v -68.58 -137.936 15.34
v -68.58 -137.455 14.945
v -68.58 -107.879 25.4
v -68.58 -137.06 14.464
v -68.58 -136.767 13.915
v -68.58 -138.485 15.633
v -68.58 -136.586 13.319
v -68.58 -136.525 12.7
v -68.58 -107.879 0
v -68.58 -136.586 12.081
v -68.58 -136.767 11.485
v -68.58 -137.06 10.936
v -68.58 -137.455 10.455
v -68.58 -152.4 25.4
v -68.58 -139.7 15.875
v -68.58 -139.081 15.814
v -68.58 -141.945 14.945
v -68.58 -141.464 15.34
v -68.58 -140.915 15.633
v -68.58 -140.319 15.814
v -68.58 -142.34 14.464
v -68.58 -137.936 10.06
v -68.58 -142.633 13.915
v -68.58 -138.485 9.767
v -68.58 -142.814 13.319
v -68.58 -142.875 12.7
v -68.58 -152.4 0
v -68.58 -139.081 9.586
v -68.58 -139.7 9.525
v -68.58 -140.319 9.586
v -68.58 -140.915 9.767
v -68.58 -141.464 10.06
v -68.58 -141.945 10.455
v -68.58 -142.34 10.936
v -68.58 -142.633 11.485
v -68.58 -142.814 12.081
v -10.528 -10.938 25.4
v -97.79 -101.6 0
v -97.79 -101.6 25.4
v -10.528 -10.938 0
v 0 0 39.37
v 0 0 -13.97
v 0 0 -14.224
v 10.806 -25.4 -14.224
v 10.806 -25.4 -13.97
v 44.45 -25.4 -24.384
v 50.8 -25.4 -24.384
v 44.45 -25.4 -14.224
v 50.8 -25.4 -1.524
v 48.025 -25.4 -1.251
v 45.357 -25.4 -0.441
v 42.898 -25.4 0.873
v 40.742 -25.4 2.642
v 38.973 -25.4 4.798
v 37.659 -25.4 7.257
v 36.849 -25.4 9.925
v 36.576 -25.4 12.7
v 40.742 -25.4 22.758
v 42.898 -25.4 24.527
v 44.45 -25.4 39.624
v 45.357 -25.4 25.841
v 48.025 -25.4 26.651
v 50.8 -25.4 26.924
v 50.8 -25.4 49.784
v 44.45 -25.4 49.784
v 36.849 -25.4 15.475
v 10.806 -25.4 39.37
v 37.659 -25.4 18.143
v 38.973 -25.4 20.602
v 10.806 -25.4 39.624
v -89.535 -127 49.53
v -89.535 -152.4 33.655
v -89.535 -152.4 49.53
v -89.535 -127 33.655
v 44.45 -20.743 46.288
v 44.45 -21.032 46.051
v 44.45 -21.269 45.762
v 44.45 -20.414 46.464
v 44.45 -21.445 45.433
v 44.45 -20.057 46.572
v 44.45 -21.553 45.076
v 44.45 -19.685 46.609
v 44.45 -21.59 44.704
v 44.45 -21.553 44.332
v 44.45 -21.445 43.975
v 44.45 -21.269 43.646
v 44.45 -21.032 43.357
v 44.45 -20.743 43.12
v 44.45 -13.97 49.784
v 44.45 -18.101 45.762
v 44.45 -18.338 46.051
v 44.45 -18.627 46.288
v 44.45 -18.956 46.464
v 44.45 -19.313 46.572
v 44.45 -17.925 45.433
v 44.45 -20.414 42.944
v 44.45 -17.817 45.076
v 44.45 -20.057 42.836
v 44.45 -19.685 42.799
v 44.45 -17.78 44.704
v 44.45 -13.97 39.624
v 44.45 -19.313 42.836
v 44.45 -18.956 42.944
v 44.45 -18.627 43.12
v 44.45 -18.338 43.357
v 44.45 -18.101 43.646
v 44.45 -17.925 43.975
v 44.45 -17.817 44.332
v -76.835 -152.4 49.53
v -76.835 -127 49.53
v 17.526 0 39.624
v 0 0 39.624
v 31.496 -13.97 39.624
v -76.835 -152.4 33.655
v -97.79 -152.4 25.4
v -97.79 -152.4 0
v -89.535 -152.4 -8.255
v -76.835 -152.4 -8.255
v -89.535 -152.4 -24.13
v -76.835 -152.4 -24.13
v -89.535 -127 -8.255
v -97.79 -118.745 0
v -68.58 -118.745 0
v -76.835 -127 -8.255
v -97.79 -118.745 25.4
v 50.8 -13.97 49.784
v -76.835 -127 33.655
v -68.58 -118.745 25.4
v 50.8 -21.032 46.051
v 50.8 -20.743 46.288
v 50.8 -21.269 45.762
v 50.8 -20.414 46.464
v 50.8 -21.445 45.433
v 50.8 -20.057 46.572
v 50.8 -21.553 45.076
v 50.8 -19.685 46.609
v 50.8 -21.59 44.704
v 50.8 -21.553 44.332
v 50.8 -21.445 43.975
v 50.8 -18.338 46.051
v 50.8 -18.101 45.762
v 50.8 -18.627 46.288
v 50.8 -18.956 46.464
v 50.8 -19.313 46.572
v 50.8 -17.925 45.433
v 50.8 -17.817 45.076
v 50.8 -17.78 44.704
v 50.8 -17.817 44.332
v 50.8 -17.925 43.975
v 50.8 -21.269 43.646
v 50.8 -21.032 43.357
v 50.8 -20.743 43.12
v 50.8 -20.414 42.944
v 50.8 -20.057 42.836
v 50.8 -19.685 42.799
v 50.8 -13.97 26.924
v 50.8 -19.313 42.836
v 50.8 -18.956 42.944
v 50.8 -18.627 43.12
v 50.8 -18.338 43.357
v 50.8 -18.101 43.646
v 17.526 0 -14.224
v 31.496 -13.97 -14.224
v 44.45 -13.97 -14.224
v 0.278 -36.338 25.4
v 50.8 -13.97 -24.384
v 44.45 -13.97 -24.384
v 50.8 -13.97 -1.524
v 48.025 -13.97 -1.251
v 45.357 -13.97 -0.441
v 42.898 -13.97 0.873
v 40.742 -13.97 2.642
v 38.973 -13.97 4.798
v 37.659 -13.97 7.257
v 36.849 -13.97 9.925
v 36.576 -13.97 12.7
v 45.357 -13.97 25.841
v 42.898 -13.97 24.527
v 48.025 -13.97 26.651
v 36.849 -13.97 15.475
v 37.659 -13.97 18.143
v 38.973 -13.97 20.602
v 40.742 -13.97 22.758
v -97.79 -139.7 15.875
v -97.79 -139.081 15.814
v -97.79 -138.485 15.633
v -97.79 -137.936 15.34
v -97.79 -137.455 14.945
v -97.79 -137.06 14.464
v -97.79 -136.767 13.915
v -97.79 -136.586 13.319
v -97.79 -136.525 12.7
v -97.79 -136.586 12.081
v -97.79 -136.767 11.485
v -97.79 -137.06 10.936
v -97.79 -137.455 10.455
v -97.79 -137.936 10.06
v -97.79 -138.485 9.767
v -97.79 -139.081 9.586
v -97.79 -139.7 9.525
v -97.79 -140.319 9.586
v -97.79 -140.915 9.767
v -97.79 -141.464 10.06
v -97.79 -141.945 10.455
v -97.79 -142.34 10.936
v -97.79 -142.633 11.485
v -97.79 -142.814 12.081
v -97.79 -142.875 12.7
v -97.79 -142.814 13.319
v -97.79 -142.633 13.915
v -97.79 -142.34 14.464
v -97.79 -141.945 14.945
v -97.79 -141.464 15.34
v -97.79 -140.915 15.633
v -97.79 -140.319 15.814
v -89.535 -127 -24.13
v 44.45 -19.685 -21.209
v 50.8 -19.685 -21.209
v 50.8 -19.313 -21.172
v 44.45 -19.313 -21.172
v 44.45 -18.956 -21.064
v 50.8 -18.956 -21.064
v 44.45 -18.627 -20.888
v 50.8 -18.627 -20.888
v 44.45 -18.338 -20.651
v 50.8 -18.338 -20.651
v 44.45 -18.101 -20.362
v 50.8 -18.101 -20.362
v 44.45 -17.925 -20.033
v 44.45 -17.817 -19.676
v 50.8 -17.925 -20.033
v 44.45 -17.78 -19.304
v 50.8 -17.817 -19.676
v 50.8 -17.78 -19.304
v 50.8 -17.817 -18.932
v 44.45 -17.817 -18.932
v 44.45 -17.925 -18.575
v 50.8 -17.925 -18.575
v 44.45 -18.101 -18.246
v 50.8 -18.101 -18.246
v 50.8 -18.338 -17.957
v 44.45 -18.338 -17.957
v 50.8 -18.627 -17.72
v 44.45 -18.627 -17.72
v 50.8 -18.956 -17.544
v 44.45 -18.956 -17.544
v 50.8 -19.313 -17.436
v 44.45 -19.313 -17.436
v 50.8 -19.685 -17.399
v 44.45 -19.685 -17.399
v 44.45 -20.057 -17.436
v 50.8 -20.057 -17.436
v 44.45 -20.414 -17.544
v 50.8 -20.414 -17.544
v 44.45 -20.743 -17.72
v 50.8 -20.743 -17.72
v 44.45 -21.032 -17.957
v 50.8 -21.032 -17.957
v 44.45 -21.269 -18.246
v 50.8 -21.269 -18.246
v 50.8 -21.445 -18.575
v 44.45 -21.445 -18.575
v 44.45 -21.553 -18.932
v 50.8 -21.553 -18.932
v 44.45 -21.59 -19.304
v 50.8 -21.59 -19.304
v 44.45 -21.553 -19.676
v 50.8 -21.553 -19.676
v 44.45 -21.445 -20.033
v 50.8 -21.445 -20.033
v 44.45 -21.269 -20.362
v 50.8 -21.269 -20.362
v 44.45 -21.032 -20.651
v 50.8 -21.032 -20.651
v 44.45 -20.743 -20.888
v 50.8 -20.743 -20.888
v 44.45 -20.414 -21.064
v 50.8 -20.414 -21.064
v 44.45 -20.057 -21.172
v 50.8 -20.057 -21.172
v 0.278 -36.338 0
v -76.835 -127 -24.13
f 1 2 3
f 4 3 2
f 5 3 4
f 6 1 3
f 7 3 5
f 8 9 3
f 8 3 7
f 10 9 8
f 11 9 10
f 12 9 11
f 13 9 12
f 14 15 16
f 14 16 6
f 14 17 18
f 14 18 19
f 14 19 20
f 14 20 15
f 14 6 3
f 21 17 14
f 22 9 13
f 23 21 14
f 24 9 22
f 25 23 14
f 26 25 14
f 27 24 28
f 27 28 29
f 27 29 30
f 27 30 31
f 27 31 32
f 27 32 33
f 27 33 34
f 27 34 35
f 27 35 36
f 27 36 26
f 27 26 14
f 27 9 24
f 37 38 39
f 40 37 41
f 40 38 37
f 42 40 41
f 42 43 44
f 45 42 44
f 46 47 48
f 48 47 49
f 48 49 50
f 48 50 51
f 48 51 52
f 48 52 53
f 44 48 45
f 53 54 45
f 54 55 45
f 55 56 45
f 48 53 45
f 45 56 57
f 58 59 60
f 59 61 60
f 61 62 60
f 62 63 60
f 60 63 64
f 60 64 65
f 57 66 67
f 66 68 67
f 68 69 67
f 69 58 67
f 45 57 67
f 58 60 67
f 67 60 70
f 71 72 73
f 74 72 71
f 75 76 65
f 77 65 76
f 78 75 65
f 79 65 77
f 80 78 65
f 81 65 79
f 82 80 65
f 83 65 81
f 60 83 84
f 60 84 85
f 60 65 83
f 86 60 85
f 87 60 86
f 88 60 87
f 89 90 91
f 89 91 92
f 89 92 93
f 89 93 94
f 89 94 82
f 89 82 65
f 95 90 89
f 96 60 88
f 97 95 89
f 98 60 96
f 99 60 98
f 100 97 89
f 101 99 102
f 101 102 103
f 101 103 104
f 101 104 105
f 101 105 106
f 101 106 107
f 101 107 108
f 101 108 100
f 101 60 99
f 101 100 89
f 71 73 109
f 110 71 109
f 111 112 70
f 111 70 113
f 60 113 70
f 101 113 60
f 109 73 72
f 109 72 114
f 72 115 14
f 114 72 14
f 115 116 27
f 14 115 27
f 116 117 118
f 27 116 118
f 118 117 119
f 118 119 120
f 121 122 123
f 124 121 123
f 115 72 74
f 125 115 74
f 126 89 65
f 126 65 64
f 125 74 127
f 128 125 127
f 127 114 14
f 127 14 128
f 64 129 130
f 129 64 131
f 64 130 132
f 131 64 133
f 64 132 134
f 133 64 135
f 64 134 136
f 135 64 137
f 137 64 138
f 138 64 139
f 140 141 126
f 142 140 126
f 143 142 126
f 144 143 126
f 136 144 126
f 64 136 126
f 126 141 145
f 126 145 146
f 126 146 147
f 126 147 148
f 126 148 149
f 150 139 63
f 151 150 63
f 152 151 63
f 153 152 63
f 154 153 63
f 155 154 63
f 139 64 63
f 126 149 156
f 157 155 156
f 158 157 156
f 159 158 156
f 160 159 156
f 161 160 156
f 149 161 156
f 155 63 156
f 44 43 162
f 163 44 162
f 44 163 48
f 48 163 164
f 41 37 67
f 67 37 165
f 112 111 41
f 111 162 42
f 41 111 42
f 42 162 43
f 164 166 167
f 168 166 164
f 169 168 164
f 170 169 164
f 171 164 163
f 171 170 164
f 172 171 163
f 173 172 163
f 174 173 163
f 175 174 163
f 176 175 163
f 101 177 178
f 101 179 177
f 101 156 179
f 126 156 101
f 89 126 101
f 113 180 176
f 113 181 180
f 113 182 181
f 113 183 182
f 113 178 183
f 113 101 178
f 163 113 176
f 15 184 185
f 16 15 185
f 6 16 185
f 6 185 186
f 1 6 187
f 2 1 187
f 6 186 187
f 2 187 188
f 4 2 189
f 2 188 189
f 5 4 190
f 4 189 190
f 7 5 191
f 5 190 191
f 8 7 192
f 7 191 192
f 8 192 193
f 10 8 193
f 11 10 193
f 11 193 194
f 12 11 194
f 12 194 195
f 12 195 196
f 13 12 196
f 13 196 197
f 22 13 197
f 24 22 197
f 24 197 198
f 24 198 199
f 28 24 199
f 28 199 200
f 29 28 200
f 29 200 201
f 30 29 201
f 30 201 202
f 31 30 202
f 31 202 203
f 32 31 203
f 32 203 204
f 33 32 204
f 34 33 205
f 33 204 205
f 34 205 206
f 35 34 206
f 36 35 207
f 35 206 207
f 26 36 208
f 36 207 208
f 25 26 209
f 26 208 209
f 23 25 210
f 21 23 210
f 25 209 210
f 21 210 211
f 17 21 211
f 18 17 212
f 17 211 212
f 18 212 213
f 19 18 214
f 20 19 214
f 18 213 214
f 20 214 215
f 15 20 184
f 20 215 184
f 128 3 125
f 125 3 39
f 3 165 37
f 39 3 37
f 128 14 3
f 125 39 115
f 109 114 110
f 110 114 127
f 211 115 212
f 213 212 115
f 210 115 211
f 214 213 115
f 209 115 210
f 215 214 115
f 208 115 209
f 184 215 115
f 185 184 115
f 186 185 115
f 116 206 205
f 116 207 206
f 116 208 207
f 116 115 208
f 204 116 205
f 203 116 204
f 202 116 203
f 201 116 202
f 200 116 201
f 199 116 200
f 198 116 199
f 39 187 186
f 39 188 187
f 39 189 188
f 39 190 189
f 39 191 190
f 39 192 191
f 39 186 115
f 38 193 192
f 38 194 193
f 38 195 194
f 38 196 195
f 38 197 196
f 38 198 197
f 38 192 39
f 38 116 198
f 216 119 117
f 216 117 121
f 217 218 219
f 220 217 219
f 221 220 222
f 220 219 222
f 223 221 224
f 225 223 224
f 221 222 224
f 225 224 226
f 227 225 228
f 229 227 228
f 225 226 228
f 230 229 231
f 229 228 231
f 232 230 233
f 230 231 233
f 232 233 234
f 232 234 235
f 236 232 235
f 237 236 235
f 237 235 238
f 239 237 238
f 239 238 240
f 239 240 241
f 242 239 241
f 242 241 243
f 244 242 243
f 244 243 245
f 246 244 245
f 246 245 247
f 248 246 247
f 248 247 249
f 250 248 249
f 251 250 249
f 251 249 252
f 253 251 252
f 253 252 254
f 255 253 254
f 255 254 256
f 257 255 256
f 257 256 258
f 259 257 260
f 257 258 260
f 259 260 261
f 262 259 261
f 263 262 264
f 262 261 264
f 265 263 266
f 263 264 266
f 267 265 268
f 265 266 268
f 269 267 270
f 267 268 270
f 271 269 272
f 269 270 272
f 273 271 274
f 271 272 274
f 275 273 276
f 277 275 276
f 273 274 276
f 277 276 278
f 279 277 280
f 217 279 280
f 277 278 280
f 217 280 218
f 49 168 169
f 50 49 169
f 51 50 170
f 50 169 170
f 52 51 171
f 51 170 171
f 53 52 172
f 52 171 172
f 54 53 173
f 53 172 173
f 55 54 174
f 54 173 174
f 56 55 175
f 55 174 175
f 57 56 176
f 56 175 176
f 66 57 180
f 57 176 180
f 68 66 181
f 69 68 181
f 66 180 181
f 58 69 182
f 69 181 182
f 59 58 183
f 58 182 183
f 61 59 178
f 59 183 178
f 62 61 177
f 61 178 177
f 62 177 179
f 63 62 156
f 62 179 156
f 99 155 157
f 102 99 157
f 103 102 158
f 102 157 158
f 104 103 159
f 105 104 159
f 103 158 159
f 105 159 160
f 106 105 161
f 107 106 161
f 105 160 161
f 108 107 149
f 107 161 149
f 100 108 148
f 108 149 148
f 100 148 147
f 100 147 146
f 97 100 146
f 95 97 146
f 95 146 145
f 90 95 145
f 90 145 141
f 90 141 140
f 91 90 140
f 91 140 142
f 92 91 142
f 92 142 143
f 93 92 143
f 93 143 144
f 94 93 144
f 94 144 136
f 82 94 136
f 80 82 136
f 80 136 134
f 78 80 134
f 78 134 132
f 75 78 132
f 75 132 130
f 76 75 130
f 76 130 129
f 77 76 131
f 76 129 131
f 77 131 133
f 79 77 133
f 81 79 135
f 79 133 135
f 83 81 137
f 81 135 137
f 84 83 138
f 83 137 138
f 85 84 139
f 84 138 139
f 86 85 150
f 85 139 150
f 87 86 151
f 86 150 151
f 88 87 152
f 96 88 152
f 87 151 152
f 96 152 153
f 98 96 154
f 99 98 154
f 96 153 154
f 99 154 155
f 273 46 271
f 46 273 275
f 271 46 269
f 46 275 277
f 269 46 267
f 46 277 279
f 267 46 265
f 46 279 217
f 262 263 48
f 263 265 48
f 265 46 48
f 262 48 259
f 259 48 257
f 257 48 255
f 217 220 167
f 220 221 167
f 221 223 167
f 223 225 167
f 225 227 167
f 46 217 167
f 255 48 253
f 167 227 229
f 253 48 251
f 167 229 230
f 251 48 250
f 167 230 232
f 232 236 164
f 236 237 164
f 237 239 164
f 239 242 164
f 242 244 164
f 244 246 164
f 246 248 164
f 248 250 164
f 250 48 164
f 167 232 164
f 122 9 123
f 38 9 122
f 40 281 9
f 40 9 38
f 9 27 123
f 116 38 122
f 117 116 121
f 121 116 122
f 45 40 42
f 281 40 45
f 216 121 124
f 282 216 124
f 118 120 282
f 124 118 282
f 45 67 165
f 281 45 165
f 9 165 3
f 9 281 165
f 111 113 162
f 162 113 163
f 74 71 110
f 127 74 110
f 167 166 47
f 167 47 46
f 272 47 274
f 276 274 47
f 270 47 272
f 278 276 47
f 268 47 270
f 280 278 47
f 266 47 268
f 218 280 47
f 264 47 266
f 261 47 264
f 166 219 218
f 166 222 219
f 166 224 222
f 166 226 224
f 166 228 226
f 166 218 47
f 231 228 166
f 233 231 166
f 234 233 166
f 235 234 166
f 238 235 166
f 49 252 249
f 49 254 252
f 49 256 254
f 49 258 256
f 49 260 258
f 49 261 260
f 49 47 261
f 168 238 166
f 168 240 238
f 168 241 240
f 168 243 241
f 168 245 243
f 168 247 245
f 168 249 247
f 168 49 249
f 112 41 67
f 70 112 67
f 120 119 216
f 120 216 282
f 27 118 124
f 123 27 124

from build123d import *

# Parameters (mm, degrees)
BOSS_EXTRUDE1_DEPTH      = 25.4
BOSS_EXTRUDE4_DEPTH      = 24.13
BOSS_EXTRUDE4_DEPTH_BACK = 49.53
SKETCH7_W                = 12.7
SKETCH7_H                = 25.4
SKETCH8_R                = 3.175
CUT_EXTRUDE3_DEPTH       = 219.535967291
CHAMFER3_SIZE            = 8.255
BOSS_EXTRUDE5_DEPTH      = 14.224
BOSS_EXTRUDE5_DEPTH_BACK = 39.624
SKETCH9_R                = 14.224
CUT_EXTRUDE4_DEPTH       = 188.728167838
SKETCH11_W               = 33.274
SKETCH11_H               = 53.848
CUT_EXTRUDE5_DEPTH       = 13.97
CHAMFER4_SIZE            = 13.97
CHAMFER5_SIZE            = 13.97
SKETCH18_W               = 6.35
SKETCH18_H               = 11.43
BOSS_EXTRUDE6_DEPTH      = 10.16
SKETCH19_W               = 6.35
SKETCH19_H               = 11.43
BOSS_EXTRUDE7_DEPTH      = 10.16
SKETCH20_R               = 1.905
CUT_EXTRUDE7_DEPTH       = 10.16


with BuildPart() as part:
    # Sketch2 → Boss-Extrude1 (new body)
    with BuildSketch(Plane.XY):
        Polygon((0, 0), (50.8, 0), (50.8, -25.4), (10.806439585, -25.4), (-68.58, -107.87941775), (-68.58, -152.4), (-97.79, -152.4), (-97.79, -101.6), align=None)
    extrude(amount=BOSS_EXTRUDE1_DEPTH)

    # Sketch7 → Boss-Extrude4 (add, two sides: drawn at the far end of the back side and taken through both)
    with BuildSketch(Plane.XY.offset(25.4).offset(-BOSS_EXTRUDE4_DEPTH_BACK)):
        with Locations((-83.185, -139.7)):
            Rectangle(SKETCH7_W, SKETCH7_H)
    extrude(amount=BOSS_EXTRUDE4_DEPTH + BOSS_EXTRUDE4_DEPTH_BACK)

    # Sketch8 → Cut-Extrude3 (cut, through all)
    with BuildSketch(Plane.ZY.offset(97.79)):
        with Locations((12.7, -139.7)):
            Circle(SKETCH8_R)
    extrude(amount=-CUT_EXTRUDE3_DEPTH, mode=Mode.SUBTRACT)

    # Chamfer3
    chamfer3_edges = [part.edges().sort_by_distance(p)[0] for p in [
        (-76.835, -139.7, 25.4),
        (-76.835, -139.7, 0),
        (-83.185, -127, 25.4),
        (-83.185, -127, 0),
        (-89.535, -139.7, 25.4),
        (-89.535, -139.7, 0),
    ]]
    chamfer(chamfer3_edges, length=CHAMFER3_SIZE - 0.0001)  # a hair under: the kernel refuses the full size

    # Sketch10 → Boss-Extrude5 (add, two sides: drawn at the far end of the back side and taken through both)
    with BuildSketch(Plane.XY.offset(25.4).offset(-BOSS_EXTRUDE5_DEPTH_BACK)):
        Polygon((0, 0), (10.806439585, -25.4), (50.8, -25.4), (50.8, 0), align=None)
    extrude(amount=BOSS_EXTRUDE5_DEPTH + BOSS_EXTRUDE5_DEPTH_BACK)

    # Sketch9 → Cut-Extrude4 (cut, through all)
    with BuildSketch(Plane(origin=(0, 0, 0), x_dir=(1, 0, 0), z_dir=(0, 1, 0))):
        with Locations((50.8, -12.7)):
            Circle(SKETCH9_R)
    extrude(amount=-CUT_EXTRUDE4_DEPTH, mode=Mode.SUBTRACT)

    # Sketch11 → Cut-Extrude5 (cut)
    with BuildSketch(Plane(origin=(0, 0, 0), x_dir=(1, 0, 0), z_dir=(0, 1, 0))):
        with Locations((34.163, -12.7)):
            Rectangle(SKETCH11_W, SKETCH11_H)
    extrude(amount=-CUT_EXTRUDE5_DEPTH, mode=Mode.SUBTRACT)

    # Chamfer4
    chamfer4_edges = [part.edges().sort_by_distance(p)[0] for p in [
        (17.526, -13.97, 12.7),
    ]]
    chamfer(chamfer4_edges, length=CHAMFER4_SIZE - 0.0001)  # a hair under: the kernel refuses the full size

    # Chamfer5
    chamfer5_edges = [part.edges().sort_by_distance(p)[0] for p in [
        (5.403219792, -12.7, 0),
        (5.403219792, -12.7, 25.4),
    ]]
    chamfer(chamfer5_edges, length=CHAMFER5_SIZE)

    # Sketch18 → Boss-Extrude6 (add)
    with BuildSketch(Plane.XY.offset(39.624)):
        with Locations((47.625, -19.685)):
            Rectangle(SKETCH18_W, SKETCH18_H)
    extrude(amount=BOSS_EXTRUDE6_DEPTH)

    # Sketch19 → Boss-Extrude7 (add)
    with BuildSketch(Plane(origin=(0, 0, -14.224), x_dir=(-1, 0, 0), z_dir=(0, 0, -1))):
        with Locations((-47.625, -19.685)):
            Rectangle(SKETCH19_W, SKETCH19_H)
    extrude(amount=BOSS_EXTRUDE7_DEPTH)

    # Sketch20 → Cut-Extrude7 (cut)
    with BuildSketch(Plane(origin=(50.8, 0, 0), x_dir=(0, 0, -1), z_dir=(1, 0, 0))):
        with Locations((-44.704, -19.685)):
            Circle(SKETCH20_R)
        with Locations((19.304, -19.685)):
            Circle(SKETCH20_R)
    extrude(amount=-CUT_EXTRUDE7_DEPTH, mode=Mode.SUBTRACT)


solid = part.part
